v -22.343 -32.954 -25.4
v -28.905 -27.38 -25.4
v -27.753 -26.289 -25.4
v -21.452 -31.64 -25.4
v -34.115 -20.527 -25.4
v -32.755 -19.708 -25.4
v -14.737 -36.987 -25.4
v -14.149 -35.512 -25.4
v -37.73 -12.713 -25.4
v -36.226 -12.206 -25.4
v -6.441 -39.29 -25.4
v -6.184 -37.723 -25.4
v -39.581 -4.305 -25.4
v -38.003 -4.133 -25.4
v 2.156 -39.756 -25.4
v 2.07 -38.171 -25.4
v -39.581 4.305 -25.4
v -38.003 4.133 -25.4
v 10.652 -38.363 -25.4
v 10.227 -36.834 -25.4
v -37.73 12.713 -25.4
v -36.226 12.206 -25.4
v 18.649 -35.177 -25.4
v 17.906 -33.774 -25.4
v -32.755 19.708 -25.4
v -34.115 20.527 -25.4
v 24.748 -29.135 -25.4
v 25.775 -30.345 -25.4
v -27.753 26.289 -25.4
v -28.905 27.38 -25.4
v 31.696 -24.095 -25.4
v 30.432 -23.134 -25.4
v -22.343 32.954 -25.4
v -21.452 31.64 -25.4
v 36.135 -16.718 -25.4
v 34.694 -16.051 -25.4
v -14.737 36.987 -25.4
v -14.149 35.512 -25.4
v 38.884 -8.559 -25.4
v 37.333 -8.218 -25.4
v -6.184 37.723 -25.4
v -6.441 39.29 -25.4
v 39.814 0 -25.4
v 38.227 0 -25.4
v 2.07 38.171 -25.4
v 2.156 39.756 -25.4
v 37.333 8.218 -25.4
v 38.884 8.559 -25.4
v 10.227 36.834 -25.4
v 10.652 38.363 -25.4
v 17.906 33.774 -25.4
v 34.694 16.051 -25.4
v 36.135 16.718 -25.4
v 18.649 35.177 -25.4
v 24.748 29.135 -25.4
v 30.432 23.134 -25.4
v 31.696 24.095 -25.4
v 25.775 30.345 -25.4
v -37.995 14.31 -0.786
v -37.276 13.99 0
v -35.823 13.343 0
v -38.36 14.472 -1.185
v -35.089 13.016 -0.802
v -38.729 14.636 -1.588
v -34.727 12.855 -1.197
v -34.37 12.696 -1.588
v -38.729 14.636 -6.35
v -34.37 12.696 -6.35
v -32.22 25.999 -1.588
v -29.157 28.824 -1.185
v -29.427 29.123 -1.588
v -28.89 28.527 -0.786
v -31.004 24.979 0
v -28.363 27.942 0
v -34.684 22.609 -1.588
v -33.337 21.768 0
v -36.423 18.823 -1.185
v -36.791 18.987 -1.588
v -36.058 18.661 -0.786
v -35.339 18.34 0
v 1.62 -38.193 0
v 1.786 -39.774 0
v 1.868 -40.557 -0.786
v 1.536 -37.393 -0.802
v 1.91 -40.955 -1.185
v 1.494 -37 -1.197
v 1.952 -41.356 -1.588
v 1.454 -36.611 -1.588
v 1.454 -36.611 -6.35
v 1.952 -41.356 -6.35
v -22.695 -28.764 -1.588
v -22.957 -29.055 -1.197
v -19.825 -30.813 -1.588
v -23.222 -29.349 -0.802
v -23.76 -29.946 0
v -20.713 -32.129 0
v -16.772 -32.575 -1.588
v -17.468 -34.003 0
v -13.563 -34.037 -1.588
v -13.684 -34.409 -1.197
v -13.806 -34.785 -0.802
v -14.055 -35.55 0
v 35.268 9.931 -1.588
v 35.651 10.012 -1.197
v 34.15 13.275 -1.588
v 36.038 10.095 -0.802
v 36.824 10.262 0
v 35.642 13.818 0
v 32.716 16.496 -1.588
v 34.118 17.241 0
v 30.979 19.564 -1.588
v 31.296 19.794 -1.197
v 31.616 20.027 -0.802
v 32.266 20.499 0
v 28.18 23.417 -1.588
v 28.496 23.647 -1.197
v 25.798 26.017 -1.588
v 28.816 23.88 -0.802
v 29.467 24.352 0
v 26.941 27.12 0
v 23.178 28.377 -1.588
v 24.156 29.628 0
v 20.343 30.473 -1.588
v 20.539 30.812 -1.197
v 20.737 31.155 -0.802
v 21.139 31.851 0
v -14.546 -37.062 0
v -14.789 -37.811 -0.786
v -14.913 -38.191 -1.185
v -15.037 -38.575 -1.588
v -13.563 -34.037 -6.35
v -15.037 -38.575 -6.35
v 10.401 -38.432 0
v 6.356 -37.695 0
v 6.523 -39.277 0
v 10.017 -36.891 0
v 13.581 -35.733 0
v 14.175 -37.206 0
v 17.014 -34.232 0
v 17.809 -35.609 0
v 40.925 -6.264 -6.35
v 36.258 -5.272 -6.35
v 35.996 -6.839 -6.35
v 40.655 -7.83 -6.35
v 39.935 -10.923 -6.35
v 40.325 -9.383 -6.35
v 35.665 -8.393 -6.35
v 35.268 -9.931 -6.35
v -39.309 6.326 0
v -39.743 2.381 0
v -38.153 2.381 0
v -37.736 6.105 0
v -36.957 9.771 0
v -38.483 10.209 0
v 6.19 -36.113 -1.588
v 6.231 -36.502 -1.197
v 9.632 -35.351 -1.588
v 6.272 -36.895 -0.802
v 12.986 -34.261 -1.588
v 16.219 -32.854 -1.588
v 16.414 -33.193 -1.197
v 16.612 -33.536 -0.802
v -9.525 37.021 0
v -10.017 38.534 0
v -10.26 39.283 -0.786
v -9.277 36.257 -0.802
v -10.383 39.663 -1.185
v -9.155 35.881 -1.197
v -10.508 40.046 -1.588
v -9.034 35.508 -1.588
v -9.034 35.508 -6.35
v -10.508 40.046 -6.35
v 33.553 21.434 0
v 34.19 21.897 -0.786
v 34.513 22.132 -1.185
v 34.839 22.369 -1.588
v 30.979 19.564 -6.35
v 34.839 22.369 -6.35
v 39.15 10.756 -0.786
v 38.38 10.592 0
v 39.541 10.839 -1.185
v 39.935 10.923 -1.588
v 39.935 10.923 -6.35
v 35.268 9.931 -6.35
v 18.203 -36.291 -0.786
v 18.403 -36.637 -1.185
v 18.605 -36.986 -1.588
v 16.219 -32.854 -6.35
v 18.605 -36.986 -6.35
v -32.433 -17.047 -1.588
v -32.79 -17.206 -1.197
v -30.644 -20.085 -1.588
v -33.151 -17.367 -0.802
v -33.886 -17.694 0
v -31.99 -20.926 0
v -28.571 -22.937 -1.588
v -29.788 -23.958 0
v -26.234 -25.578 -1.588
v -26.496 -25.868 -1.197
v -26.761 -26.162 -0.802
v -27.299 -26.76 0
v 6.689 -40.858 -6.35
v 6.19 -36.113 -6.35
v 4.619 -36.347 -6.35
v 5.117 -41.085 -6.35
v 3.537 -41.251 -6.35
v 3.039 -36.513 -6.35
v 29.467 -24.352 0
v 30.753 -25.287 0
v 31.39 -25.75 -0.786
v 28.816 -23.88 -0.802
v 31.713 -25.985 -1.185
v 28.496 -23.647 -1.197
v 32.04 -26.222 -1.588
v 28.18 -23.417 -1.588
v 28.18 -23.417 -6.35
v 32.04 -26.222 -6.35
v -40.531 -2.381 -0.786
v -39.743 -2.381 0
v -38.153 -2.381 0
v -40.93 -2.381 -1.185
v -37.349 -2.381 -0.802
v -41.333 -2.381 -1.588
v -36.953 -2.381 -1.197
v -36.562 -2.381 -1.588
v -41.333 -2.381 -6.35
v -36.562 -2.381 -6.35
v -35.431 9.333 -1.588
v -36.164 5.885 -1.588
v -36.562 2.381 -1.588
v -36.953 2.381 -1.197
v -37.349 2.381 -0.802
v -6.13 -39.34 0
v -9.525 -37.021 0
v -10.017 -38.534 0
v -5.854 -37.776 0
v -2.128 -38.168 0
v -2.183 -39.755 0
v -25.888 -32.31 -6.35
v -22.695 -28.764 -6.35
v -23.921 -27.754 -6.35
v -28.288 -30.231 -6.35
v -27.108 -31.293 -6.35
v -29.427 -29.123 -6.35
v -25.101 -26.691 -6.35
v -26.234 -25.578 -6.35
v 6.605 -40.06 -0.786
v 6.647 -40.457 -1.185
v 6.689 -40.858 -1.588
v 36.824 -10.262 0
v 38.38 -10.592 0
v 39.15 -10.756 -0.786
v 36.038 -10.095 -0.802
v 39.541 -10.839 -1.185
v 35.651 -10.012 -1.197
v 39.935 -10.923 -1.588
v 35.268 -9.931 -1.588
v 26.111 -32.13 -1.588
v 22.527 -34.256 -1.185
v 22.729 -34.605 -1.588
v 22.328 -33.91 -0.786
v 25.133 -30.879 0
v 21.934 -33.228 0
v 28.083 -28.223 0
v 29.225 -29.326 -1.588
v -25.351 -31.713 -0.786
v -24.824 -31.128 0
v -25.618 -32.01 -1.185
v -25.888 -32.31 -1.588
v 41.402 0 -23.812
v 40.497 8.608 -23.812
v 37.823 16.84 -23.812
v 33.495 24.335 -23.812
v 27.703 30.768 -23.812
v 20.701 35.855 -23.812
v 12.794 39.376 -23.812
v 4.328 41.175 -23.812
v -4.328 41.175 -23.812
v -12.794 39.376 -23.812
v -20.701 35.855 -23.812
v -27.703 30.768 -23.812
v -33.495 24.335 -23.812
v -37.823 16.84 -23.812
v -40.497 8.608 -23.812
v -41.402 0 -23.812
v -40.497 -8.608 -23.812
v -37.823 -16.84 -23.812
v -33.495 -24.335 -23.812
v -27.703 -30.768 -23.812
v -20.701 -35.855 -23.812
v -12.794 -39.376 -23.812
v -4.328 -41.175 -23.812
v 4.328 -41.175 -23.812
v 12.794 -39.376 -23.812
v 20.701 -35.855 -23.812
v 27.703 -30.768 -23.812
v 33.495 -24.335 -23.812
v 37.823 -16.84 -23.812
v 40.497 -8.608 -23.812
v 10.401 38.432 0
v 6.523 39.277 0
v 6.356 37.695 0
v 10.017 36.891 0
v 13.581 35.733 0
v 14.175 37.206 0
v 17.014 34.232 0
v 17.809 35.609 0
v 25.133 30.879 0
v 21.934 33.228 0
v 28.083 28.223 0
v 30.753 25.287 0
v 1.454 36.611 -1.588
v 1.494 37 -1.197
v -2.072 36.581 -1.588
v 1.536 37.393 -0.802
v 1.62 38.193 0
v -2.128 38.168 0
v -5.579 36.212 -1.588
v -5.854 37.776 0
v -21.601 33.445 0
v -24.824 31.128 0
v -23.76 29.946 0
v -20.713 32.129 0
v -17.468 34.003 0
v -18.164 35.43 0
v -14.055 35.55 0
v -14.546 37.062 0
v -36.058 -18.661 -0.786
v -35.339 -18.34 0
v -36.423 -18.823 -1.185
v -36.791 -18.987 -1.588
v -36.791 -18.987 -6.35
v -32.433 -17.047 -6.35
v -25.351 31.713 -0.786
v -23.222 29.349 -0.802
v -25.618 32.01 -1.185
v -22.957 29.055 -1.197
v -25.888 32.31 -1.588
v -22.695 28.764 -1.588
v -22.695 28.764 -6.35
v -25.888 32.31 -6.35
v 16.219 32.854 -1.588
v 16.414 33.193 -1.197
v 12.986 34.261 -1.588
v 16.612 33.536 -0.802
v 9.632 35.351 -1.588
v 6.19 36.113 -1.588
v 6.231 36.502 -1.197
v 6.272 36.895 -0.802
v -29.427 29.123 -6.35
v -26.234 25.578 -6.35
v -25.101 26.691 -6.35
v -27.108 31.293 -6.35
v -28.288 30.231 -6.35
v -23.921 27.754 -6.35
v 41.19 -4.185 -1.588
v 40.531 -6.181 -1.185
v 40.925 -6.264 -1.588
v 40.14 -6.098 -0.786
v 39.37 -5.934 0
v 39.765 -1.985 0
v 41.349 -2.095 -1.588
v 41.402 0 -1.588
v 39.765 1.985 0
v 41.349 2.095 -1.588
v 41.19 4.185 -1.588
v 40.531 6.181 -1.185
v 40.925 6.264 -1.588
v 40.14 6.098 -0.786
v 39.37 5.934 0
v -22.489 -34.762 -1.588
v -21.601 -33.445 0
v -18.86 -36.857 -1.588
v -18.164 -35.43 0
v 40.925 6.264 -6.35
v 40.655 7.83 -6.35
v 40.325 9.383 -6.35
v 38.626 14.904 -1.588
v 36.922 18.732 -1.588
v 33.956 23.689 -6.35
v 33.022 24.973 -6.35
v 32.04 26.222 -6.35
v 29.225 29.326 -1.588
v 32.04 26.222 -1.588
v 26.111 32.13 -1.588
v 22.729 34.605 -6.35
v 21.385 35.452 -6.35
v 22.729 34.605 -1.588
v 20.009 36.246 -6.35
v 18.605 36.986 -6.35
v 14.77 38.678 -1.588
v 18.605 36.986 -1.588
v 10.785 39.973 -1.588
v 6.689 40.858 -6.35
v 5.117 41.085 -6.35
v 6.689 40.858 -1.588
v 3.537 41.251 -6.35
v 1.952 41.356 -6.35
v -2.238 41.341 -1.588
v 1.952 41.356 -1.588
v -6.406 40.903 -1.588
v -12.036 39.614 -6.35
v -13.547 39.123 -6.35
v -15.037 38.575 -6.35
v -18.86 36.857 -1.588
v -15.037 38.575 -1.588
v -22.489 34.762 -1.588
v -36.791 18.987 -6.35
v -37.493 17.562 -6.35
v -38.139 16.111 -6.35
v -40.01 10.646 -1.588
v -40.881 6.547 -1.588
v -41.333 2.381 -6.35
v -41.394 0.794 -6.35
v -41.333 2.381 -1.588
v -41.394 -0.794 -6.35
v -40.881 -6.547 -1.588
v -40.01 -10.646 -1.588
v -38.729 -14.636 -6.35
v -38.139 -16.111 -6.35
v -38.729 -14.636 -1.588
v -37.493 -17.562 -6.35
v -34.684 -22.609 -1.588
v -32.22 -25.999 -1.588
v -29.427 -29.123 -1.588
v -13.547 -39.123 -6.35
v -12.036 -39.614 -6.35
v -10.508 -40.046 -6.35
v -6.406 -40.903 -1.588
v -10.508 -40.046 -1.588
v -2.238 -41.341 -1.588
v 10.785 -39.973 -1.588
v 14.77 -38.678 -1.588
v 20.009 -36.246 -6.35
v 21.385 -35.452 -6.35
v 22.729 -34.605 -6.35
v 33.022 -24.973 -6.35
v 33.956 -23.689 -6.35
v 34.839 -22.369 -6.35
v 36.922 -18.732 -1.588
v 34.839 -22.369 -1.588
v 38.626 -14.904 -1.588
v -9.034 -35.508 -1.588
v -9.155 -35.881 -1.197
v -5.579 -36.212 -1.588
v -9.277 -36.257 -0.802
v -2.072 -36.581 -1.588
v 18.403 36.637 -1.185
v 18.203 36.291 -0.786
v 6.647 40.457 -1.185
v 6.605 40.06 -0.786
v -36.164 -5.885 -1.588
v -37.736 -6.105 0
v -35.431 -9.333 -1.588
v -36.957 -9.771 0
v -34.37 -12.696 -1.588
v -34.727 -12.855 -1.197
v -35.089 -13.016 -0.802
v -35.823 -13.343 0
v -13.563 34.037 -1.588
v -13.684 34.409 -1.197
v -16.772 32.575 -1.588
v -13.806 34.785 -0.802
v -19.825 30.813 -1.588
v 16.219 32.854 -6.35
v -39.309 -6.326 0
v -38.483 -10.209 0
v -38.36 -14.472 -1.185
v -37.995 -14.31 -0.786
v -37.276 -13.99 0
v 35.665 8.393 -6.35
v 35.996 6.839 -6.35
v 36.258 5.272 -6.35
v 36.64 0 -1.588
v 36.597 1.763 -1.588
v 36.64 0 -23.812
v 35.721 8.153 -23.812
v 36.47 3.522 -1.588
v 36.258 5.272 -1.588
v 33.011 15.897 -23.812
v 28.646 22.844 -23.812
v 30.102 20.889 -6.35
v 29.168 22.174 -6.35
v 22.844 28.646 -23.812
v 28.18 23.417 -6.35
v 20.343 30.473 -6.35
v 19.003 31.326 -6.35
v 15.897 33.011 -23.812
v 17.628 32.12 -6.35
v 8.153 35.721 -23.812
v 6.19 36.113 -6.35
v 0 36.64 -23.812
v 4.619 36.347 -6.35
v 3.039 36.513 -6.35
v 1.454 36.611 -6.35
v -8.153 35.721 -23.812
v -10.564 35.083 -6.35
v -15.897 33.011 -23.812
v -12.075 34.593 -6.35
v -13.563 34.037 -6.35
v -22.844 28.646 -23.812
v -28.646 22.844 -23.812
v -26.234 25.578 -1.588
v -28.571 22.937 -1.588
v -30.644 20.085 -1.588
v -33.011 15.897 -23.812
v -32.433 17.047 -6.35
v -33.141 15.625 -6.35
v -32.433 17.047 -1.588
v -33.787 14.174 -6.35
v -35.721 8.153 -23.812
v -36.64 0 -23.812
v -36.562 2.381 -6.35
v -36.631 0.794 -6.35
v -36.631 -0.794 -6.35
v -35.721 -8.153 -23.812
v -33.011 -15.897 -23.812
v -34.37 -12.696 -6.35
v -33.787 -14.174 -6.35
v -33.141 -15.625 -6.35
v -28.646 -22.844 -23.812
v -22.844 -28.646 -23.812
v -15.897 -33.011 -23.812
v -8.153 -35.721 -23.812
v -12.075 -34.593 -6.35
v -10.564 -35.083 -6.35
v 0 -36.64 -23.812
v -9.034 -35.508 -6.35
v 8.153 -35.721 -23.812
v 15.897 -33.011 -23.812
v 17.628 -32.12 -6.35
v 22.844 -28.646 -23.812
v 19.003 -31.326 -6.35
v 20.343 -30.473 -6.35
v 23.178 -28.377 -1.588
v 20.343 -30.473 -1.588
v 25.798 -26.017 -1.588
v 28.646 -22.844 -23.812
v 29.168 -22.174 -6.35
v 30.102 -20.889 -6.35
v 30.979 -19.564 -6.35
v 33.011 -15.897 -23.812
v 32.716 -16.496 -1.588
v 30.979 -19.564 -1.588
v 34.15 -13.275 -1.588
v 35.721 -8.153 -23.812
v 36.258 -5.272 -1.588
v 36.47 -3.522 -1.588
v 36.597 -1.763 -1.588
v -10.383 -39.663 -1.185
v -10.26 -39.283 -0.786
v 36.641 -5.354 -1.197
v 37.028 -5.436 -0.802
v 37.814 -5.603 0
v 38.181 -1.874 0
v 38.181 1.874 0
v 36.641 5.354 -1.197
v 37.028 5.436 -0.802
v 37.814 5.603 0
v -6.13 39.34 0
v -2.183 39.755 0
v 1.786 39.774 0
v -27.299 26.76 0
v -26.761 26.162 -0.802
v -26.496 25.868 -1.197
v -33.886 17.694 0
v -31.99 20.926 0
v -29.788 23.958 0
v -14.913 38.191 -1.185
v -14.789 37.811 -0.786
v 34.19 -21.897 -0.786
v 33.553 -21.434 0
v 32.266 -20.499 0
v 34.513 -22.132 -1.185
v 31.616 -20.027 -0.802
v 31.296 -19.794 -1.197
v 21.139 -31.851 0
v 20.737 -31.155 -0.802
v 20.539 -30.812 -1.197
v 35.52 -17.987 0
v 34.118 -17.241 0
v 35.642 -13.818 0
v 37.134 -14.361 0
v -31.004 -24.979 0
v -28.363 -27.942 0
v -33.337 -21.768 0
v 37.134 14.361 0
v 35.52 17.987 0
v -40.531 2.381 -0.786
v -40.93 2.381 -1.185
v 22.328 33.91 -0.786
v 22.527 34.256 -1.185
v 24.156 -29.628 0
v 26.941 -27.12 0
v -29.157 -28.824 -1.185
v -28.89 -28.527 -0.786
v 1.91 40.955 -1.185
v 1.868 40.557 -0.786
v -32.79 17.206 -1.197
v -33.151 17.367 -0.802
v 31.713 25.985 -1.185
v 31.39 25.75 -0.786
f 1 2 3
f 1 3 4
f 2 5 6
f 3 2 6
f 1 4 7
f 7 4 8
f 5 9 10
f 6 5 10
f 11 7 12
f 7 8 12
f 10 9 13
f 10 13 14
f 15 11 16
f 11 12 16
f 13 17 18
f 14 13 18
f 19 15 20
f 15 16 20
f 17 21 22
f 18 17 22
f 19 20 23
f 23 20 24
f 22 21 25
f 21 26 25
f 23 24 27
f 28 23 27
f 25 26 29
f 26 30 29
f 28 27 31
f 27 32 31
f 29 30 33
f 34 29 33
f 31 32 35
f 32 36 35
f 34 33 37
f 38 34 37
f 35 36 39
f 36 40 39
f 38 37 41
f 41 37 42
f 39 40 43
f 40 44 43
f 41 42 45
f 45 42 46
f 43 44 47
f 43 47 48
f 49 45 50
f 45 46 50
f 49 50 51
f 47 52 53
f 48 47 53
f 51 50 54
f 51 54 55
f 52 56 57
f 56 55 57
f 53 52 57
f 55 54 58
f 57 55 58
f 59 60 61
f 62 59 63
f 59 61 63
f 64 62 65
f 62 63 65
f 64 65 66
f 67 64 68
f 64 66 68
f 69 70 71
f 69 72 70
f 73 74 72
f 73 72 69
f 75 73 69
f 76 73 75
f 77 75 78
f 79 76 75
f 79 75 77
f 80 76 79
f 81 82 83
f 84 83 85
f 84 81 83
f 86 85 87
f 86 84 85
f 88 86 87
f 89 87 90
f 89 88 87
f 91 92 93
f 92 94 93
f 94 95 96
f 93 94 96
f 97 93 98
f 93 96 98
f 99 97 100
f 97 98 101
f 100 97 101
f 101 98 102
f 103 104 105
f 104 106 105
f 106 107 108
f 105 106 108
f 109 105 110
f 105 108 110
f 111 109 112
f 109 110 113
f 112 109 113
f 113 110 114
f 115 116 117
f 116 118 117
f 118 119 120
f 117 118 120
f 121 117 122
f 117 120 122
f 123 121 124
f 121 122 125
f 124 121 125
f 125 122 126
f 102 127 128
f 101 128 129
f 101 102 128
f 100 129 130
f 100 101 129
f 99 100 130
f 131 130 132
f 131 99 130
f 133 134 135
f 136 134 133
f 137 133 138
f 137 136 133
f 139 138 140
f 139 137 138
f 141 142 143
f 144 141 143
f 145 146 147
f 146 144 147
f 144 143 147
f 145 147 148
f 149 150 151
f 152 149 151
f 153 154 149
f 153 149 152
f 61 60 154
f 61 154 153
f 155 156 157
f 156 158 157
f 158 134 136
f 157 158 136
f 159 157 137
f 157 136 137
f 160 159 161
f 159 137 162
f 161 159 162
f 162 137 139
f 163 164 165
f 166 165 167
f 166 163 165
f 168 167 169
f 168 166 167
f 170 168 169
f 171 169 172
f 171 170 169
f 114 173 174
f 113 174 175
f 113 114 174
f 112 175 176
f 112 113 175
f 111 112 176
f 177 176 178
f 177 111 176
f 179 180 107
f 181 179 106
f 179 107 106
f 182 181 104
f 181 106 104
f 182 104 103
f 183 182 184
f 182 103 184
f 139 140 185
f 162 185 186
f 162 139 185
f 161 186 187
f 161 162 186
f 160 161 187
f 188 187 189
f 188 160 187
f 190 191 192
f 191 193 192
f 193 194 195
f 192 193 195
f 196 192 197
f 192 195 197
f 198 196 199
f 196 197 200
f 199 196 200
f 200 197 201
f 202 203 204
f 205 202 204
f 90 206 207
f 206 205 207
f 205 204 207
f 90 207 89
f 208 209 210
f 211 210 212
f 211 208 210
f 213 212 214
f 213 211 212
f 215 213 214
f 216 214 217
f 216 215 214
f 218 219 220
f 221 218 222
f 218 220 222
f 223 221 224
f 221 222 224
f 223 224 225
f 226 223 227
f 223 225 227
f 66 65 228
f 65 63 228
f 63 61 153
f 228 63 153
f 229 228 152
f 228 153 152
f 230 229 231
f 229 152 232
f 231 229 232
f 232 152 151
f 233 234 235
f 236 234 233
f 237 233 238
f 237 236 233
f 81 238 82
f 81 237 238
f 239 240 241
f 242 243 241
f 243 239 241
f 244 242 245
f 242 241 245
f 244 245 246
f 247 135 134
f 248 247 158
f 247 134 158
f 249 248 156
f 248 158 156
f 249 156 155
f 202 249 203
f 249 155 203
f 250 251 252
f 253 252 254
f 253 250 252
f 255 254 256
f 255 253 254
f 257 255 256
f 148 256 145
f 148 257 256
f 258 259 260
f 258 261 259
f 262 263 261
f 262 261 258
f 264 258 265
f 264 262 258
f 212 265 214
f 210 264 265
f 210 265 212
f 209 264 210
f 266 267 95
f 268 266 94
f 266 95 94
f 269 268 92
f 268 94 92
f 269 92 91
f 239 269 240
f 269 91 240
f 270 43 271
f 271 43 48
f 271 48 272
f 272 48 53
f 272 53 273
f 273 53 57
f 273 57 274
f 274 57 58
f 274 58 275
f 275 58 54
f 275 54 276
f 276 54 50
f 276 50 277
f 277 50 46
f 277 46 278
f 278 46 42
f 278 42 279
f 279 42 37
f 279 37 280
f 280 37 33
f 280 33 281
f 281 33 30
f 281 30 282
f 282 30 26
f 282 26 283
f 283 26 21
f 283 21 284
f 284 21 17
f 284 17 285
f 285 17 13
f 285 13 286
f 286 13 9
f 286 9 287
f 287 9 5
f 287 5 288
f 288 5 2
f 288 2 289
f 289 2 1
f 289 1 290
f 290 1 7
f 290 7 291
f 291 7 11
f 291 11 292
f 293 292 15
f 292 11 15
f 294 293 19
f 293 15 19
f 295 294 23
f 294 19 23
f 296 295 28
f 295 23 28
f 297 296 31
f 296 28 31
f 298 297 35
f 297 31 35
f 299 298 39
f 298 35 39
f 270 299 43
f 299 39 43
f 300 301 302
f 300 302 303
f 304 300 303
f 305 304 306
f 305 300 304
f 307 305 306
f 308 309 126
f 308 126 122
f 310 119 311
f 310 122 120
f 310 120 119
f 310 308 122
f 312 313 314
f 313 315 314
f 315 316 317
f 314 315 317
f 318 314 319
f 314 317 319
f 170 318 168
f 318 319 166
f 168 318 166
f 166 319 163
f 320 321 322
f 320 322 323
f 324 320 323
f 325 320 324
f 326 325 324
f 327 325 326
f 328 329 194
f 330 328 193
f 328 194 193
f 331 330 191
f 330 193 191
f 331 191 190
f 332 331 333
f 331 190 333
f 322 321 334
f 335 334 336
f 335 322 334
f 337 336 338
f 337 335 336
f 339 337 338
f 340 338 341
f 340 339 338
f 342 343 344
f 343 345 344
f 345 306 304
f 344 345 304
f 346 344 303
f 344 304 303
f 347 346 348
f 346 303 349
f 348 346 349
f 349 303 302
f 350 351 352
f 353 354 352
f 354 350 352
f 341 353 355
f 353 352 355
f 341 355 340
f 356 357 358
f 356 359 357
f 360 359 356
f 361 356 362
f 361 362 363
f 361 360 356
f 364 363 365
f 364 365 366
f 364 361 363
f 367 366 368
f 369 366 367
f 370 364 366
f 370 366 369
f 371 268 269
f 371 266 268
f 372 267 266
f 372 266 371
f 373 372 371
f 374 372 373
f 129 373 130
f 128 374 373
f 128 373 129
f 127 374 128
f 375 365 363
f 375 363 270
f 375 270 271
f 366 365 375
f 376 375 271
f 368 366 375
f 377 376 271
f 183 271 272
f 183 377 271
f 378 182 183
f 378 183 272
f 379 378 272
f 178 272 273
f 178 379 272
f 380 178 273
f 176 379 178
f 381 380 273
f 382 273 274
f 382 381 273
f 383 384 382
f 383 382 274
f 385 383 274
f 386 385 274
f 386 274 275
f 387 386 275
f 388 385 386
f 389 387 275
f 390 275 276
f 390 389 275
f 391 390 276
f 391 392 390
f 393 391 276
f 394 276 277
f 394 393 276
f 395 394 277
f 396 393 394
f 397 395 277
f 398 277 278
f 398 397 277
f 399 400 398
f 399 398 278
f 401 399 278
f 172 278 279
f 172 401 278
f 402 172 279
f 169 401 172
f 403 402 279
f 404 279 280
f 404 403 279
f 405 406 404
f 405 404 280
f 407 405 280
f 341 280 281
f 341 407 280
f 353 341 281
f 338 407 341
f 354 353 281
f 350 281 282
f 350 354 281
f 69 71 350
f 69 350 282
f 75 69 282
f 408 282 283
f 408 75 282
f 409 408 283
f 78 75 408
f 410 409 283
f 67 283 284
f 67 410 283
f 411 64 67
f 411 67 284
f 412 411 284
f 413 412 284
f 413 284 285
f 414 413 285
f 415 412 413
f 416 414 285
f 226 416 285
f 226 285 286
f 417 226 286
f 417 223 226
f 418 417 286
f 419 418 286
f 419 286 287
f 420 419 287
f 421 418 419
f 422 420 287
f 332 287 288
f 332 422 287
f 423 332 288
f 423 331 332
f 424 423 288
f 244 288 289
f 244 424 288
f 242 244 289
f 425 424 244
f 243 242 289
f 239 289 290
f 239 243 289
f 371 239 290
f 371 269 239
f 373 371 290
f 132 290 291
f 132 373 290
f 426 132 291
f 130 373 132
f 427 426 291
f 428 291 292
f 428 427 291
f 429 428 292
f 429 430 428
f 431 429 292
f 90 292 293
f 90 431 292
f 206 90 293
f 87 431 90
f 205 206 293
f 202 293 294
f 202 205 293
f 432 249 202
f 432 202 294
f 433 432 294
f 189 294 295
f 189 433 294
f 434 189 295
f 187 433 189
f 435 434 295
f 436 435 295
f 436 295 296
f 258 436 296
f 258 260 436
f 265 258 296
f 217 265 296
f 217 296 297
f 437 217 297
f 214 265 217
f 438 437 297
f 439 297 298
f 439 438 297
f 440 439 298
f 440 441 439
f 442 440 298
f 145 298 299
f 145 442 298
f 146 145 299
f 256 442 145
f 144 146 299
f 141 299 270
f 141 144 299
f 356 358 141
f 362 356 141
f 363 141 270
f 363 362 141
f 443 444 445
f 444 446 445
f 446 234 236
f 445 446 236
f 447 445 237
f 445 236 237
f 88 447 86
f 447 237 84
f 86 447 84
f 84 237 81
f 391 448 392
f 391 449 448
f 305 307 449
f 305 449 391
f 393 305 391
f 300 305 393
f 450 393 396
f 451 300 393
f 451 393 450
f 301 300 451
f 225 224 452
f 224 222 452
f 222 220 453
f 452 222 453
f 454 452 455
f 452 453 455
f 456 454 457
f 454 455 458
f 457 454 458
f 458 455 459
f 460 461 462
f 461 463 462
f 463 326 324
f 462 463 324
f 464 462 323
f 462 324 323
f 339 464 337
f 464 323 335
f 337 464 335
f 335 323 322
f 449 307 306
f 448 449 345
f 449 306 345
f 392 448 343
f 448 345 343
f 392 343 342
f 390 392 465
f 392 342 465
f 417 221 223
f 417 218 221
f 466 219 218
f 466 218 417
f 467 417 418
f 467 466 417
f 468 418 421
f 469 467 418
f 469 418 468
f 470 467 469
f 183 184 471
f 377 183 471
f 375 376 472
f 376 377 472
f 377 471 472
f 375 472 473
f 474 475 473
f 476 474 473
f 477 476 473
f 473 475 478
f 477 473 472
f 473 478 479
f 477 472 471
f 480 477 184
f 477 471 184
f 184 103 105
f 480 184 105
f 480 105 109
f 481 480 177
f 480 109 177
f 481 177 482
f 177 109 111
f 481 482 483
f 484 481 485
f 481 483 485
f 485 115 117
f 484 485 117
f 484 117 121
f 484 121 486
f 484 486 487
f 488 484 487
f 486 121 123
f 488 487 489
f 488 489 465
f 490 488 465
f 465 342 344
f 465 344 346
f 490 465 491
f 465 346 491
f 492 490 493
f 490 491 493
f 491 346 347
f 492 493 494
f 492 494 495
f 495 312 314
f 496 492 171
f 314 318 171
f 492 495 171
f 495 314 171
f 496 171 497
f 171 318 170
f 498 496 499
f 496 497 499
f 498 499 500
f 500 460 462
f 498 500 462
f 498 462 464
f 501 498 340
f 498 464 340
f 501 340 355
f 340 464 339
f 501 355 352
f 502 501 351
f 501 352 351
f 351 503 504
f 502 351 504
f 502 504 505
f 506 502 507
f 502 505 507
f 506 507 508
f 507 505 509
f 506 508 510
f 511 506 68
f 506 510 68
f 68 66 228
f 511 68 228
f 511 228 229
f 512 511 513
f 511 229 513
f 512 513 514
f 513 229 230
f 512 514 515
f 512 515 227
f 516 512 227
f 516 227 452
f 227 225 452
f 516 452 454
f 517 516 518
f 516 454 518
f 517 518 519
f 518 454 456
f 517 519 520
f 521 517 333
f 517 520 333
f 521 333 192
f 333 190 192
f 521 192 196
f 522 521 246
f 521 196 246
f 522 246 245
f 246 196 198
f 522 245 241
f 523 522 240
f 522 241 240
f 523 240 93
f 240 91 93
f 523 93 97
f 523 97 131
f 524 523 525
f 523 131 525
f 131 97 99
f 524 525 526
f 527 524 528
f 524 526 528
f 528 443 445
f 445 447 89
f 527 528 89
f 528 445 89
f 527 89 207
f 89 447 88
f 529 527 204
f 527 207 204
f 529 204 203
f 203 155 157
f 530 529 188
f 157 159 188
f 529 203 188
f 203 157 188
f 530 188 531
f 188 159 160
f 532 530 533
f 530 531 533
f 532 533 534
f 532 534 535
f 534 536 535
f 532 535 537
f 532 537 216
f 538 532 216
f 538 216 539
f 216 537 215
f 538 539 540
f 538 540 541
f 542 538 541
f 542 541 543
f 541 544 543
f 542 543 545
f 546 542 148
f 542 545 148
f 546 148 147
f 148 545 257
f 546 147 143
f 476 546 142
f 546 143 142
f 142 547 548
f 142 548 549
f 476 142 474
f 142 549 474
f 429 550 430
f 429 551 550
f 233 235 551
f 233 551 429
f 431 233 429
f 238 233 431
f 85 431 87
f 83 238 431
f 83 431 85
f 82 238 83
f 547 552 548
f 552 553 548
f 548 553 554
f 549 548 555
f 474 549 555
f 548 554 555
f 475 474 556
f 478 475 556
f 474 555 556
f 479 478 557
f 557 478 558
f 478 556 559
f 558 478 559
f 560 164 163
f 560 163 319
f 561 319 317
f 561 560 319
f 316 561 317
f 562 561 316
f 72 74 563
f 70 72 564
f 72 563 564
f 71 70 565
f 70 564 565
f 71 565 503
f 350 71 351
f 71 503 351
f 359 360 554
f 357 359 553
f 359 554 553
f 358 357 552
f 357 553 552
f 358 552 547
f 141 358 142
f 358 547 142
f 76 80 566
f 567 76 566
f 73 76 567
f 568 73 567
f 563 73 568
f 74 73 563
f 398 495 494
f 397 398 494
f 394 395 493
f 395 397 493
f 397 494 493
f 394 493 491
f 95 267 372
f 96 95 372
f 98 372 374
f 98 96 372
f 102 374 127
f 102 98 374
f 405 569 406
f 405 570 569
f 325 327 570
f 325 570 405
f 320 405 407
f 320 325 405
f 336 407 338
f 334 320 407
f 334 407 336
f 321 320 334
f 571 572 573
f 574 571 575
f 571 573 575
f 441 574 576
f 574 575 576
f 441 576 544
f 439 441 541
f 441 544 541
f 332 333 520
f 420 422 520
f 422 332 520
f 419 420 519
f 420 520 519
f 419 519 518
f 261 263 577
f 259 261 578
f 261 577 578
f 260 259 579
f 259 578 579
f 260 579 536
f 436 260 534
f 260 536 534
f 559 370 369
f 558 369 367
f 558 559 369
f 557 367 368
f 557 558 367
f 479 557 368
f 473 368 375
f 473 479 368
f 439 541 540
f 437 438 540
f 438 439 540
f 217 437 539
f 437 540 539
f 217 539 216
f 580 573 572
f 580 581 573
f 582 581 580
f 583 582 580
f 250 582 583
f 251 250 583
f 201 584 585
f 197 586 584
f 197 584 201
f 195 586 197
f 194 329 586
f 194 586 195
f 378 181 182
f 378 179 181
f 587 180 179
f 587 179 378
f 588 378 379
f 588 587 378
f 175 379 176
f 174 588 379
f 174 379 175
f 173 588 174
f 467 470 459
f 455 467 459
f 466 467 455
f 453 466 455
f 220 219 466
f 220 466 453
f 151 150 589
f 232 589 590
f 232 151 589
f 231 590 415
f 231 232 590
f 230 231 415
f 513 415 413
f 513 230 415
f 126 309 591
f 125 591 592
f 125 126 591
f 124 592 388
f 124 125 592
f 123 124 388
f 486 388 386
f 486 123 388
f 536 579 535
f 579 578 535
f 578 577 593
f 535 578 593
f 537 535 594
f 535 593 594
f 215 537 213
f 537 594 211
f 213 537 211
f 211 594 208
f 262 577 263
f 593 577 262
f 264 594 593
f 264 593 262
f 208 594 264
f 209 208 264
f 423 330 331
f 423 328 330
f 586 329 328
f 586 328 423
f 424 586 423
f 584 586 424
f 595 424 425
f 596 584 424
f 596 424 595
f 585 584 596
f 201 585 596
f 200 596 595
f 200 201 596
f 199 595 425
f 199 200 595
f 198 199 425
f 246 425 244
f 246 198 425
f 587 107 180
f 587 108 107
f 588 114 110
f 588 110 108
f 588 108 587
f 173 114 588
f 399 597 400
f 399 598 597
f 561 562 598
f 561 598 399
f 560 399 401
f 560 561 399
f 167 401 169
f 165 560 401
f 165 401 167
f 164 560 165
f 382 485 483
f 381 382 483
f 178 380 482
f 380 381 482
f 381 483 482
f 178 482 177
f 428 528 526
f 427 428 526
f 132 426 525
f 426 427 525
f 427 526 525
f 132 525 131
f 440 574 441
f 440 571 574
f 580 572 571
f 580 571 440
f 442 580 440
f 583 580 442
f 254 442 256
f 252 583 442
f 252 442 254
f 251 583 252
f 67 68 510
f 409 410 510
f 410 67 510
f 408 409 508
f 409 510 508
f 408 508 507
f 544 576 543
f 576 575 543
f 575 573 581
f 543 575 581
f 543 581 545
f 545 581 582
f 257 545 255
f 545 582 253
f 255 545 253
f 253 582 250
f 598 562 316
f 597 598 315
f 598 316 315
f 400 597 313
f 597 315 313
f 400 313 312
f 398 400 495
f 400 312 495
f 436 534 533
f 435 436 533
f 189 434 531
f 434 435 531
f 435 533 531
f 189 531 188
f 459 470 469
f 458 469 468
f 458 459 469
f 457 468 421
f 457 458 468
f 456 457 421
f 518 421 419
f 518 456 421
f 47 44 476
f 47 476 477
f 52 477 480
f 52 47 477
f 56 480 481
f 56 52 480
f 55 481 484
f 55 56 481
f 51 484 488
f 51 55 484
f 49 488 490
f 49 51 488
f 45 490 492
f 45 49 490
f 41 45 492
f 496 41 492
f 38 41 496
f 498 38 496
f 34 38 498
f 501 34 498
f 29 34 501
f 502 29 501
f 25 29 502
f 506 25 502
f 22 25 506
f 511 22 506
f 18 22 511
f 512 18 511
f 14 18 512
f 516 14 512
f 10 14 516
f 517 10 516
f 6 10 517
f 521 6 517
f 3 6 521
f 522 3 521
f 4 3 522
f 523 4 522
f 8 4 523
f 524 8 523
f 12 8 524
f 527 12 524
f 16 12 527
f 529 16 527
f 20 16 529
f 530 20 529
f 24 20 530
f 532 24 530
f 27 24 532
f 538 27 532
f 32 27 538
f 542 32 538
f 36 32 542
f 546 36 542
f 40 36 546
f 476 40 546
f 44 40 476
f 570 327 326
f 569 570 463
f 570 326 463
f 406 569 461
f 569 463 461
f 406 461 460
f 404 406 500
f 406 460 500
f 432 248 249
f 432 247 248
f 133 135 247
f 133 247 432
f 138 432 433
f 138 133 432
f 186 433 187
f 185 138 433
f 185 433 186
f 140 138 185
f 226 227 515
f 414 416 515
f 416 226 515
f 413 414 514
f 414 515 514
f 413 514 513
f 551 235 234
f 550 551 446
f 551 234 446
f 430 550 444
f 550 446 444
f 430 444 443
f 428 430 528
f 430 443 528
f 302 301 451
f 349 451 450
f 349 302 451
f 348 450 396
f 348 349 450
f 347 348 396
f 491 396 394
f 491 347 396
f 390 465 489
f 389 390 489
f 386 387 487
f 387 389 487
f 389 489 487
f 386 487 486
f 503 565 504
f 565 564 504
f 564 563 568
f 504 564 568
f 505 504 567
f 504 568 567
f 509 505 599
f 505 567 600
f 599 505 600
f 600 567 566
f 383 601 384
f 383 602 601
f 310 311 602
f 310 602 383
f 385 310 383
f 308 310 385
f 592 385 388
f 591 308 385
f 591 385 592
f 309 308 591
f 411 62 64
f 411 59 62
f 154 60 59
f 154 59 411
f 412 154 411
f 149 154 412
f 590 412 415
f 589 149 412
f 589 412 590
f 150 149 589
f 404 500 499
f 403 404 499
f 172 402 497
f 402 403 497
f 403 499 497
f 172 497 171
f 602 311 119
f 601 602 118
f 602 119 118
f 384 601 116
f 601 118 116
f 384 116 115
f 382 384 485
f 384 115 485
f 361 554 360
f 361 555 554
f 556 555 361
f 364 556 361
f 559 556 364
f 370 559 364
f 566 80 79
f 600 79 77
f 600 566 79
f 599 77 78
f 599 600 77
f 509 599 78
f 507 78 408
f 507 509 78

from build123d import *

# Parameters (mm, degrees)
SKETCH1_R           = 41.402
SKETCH1_R_2         = 36.6395
BOSS_EXTRUDE1_DEPTH = 25.4
CHAMFER1_SIZE       = 1.5875
SKETCH2_W           = 12.7
SKETCH2_H           = 4.7625
CUT_EXTRUDE1_DEPTH  = 64.823281081
CIRPATTERN1_COUNT   = 15


with BuildPart() as part:
    # Sketch1 → Boss-Extrude1 (new body)
    with BuildSketch(Plane.XY):
        Circle(SKETCH1_R)
        Circle(SKETCH1_R_2, mode=Mode.SUBTRACT)
    extrude(amount=-BOSS_EXTRUDE1_DEPTH)

    # Chamfer1
    chamfer1_edges = [part.edges().sort_by_distance(p)[0] for p in [
        (-41.402, 0, 0),
        (-41.402, 0, -25.4),
        (-36.6395, 0, -25.4),
        (-36.6395, 0, 0),
    ]]
    chamfer(chamfer1_edges, length=CHAMFER1_SIZE)

    # Sketch2 → Cut-Extrude1 (cut, through all)
    with BuildSketch(Plane(origin=(0, 0, 0), x_dir=(0, 0, -1), z_dir=(1, 0, 0))):
        Rectangle(SKETCH2_W, SKETCH2_H)
    cut_extrude1 = extrude(amount=-CUT_EXTRUDE1_DEPTH, mode=Mode.SUBTRACT)

    # CirPattern1: Cut-Extrude1 ×15 about axis
    cirpattern1_axis = Axis((0, 0, 0), (0, 0, 1))
    for i in range(1, CIRPATTERN1_COUNT):
        add(cut_extrude1.rotate(cirpattern1_axis, i * 360 / CIRPATTERN1_COUNT), mode=Mode.SUBTRACT)


solid = part.part
